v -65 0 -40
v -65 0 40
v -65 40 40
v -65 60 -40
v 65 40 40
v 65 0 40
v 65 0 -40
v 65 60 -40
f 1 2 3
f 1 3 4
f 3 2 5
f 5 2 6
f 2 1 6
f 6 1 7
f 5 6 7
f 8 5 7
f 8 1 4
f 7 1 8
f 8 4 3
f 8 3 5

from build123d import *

# Parameters (mm, degrees)
SKETCH1_W           = 130
SKETCH1_H           = 80
BOSS_EXTRUDE1_DEPTH = 60
CHAMFER1_SIZE2      = 80
CHAMFER1_SIZE       = 20


with BuildPart() as part:
    # Sketch1 → Boss-Extrude1 (new body)
    with BuildSketch(Plane(origin=(0, 0, 0), x_dir=(1, 0, 0), z_dir=(0, 1, 0))):
        Rectangle(SKETCH1_W, SKETCH1_H)
    extrude(amount=BOSS_EXTRUDE1_DEPTH)

    # Chamfer1
    chamfer1_edges = [part.edges().sort_by_distance(p)[0] for p in [
        (0, 60, 40),
    ]]
    chamfer1_side = [part.faces().sort_by_distance(p)[0] for p in [
        (0, 59.6, 40),
    ]]
    chamfer(chamfer1_edges, length=CHAMFER1_SIZE - 0.0001, length2=CHAMFER1_SIZE2 - 0.0001, reference=chamfer1_side[0])  # a hair under: the kernel refuses the full size


solid = part.part
